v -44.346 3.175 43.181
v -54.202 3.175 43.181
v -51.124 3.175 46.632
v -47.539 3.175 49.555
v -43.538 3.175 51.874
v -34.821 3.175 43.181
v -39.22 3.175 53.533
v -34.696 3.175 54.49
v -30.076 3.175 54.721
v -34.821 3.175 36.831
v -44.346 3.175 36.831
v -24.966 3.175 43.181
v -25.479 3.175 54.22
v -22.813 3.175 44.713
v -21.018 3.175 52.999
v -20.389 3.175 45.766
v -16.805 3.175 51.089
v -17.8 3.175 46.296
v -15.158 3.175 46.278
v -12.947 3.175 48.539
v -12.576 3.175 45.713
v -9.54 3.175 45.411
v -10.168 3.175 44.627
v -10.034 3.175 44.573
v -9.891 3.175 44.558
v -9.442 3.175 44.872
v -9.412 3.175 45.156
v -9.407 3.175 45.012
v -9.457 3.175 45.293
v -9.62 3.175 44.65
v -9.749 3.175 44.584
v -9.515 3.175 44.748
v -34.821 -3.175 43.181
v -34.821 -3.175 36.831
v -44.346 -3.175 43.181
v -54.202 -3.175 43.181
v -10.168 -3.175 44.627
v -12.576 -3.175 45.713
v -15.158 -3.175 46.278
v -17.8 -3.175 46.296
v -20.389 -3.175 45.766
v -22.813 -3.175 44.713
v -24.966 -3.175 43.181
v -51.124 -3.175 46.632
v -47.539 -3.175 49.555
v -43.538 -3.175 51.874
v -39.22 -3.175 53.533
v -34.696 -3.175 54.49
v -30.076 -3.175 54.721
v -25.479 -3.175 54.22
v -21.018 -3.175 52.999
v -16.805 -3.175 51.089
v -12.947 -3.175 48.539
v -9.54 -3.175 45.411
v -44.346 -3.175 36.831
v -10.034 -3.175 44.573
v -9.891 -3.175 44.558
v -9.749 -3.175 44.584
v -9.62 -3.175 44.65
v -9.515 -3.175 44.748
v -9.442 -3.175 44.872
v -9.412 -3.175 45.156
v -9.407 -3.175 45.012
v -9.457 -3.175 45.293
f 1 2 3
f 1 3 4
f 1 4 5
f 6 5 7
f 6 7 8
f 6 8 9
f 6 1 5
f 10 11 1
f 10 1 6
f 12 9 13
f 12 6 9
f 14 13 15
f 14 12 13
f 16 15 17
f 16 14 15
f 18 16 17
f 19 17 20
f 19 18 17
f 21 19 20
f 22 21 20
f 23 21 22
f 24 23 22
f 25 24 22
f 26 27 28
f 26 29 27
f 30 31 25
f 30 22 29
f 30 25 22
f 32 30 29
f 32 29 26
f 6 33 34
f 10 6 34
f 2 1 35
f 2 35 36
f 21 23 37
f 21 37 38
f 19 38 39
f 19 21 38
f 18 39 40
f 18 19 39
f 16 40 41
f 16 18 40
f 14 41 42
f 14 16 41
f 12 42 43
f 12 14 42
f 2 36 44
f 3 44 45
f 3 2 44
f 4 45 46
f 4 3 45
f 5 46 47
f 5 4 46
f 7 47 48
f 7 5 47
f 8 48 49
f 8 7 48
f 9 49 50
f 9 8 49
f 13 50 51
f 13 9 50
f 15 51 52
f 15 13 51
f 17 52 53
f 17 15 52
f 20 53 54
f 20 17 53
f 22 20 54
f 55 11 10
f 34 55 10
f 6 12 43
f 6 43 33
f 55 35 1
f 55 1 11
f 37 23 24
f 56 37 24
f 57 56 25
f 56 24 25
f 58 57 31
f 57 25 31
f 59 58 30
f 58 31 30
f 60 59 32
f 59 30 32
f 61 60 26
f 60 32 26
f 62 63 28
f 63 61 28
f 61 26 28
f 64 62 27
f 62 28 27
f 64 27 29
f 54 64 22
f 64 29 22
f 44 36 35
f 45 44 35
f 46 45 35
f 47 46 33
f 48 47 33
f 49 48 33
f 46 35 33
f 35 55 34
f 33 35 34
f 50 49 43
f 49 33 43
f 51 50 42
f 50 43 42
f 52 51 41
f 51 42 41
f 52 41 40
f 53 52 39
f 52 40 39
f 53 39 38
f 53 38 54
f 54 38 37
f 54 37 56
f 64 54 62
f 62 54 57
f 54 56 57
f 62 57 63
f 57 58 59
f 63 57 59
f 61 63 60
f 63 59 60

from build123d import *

# Parameters (mm, degrees)
BOSS_EXTRUDE1_DEPTH = 3.175
SKETCH2_W           = 9.525
SKETCH2_H           = 6.35
BOSS_EXTRUDE2_DEPTH = 6.35
CUT_EXTRUDE1_DEPTH  = 78.291604858


with BuildPart() as part:
    # Sketch1 → Boss-Extrude1 (new, symmetric)
    with BuildSketch(Plane(origin=(0, 0, 0), x_dir=(1, 0, 0), z_dir=(0, 1, 0))):
        with BuildLine():
            Line((-41.502443258, -43.180856192), (-54.202443258, -43.180856192))
            ThreePointArc((-54.202443258, -43.180856192), (-28.976499653, -54.667950949), (-5.512754363, -39.911452934))
            ThreePointArc((-5.512754363, -39.911452934), (-14.460289915, -46.180199356), (-24.965503608, -43.180856192))
            Line((-24.965503608, -43.180856192), (-41.502443258, -43.180856192))
        make_face()
    extrude(amount=BOSS_EXTRUDE1_DEPTH, both=True)

    # Sketch2 → Boss-Extrude2 (add)
    with BuildSketch(Plane(origin=(0, 3.175, 0), x_dir=(1, 0, 0), z_dir=(0, 1, 0))):
        with Locations((-39.583973433, -40.005856192)):
            Rectangle(SKETCH2_W, SKETCH2_H)
    extrude(amount=-BOSS_EXTRUDE2_DEPTH)

    # Sketch3 → Cut-Extrude1 (cut, through all)
    with BuildSketch(Plane(origin=(0, 3.175, 0), x_dir=(1, 0, 0), z_dir=(0, 1, 0))):
        with BuildLine():
            ThreePointArc((-5.512754363, -39.911452934), (-7.527252939, -42.578004595), (-10.167597026, -44.626732342))
            ThreePointArc((-10.167597026, -44.626732342), (-9.515060164, -44.74815939), (-9.539624144, -45.411443263))
            ThreePointArc((-9.539624144, -45.411443263), (-7.365201872, -42.779316528), (-5.512754363, -39.911452934))
        make_face()
    extrude(amount=-CUT_EXTRUDE1_DEPTH, mode=Mode.SUBTRACT)


solid = part.part
